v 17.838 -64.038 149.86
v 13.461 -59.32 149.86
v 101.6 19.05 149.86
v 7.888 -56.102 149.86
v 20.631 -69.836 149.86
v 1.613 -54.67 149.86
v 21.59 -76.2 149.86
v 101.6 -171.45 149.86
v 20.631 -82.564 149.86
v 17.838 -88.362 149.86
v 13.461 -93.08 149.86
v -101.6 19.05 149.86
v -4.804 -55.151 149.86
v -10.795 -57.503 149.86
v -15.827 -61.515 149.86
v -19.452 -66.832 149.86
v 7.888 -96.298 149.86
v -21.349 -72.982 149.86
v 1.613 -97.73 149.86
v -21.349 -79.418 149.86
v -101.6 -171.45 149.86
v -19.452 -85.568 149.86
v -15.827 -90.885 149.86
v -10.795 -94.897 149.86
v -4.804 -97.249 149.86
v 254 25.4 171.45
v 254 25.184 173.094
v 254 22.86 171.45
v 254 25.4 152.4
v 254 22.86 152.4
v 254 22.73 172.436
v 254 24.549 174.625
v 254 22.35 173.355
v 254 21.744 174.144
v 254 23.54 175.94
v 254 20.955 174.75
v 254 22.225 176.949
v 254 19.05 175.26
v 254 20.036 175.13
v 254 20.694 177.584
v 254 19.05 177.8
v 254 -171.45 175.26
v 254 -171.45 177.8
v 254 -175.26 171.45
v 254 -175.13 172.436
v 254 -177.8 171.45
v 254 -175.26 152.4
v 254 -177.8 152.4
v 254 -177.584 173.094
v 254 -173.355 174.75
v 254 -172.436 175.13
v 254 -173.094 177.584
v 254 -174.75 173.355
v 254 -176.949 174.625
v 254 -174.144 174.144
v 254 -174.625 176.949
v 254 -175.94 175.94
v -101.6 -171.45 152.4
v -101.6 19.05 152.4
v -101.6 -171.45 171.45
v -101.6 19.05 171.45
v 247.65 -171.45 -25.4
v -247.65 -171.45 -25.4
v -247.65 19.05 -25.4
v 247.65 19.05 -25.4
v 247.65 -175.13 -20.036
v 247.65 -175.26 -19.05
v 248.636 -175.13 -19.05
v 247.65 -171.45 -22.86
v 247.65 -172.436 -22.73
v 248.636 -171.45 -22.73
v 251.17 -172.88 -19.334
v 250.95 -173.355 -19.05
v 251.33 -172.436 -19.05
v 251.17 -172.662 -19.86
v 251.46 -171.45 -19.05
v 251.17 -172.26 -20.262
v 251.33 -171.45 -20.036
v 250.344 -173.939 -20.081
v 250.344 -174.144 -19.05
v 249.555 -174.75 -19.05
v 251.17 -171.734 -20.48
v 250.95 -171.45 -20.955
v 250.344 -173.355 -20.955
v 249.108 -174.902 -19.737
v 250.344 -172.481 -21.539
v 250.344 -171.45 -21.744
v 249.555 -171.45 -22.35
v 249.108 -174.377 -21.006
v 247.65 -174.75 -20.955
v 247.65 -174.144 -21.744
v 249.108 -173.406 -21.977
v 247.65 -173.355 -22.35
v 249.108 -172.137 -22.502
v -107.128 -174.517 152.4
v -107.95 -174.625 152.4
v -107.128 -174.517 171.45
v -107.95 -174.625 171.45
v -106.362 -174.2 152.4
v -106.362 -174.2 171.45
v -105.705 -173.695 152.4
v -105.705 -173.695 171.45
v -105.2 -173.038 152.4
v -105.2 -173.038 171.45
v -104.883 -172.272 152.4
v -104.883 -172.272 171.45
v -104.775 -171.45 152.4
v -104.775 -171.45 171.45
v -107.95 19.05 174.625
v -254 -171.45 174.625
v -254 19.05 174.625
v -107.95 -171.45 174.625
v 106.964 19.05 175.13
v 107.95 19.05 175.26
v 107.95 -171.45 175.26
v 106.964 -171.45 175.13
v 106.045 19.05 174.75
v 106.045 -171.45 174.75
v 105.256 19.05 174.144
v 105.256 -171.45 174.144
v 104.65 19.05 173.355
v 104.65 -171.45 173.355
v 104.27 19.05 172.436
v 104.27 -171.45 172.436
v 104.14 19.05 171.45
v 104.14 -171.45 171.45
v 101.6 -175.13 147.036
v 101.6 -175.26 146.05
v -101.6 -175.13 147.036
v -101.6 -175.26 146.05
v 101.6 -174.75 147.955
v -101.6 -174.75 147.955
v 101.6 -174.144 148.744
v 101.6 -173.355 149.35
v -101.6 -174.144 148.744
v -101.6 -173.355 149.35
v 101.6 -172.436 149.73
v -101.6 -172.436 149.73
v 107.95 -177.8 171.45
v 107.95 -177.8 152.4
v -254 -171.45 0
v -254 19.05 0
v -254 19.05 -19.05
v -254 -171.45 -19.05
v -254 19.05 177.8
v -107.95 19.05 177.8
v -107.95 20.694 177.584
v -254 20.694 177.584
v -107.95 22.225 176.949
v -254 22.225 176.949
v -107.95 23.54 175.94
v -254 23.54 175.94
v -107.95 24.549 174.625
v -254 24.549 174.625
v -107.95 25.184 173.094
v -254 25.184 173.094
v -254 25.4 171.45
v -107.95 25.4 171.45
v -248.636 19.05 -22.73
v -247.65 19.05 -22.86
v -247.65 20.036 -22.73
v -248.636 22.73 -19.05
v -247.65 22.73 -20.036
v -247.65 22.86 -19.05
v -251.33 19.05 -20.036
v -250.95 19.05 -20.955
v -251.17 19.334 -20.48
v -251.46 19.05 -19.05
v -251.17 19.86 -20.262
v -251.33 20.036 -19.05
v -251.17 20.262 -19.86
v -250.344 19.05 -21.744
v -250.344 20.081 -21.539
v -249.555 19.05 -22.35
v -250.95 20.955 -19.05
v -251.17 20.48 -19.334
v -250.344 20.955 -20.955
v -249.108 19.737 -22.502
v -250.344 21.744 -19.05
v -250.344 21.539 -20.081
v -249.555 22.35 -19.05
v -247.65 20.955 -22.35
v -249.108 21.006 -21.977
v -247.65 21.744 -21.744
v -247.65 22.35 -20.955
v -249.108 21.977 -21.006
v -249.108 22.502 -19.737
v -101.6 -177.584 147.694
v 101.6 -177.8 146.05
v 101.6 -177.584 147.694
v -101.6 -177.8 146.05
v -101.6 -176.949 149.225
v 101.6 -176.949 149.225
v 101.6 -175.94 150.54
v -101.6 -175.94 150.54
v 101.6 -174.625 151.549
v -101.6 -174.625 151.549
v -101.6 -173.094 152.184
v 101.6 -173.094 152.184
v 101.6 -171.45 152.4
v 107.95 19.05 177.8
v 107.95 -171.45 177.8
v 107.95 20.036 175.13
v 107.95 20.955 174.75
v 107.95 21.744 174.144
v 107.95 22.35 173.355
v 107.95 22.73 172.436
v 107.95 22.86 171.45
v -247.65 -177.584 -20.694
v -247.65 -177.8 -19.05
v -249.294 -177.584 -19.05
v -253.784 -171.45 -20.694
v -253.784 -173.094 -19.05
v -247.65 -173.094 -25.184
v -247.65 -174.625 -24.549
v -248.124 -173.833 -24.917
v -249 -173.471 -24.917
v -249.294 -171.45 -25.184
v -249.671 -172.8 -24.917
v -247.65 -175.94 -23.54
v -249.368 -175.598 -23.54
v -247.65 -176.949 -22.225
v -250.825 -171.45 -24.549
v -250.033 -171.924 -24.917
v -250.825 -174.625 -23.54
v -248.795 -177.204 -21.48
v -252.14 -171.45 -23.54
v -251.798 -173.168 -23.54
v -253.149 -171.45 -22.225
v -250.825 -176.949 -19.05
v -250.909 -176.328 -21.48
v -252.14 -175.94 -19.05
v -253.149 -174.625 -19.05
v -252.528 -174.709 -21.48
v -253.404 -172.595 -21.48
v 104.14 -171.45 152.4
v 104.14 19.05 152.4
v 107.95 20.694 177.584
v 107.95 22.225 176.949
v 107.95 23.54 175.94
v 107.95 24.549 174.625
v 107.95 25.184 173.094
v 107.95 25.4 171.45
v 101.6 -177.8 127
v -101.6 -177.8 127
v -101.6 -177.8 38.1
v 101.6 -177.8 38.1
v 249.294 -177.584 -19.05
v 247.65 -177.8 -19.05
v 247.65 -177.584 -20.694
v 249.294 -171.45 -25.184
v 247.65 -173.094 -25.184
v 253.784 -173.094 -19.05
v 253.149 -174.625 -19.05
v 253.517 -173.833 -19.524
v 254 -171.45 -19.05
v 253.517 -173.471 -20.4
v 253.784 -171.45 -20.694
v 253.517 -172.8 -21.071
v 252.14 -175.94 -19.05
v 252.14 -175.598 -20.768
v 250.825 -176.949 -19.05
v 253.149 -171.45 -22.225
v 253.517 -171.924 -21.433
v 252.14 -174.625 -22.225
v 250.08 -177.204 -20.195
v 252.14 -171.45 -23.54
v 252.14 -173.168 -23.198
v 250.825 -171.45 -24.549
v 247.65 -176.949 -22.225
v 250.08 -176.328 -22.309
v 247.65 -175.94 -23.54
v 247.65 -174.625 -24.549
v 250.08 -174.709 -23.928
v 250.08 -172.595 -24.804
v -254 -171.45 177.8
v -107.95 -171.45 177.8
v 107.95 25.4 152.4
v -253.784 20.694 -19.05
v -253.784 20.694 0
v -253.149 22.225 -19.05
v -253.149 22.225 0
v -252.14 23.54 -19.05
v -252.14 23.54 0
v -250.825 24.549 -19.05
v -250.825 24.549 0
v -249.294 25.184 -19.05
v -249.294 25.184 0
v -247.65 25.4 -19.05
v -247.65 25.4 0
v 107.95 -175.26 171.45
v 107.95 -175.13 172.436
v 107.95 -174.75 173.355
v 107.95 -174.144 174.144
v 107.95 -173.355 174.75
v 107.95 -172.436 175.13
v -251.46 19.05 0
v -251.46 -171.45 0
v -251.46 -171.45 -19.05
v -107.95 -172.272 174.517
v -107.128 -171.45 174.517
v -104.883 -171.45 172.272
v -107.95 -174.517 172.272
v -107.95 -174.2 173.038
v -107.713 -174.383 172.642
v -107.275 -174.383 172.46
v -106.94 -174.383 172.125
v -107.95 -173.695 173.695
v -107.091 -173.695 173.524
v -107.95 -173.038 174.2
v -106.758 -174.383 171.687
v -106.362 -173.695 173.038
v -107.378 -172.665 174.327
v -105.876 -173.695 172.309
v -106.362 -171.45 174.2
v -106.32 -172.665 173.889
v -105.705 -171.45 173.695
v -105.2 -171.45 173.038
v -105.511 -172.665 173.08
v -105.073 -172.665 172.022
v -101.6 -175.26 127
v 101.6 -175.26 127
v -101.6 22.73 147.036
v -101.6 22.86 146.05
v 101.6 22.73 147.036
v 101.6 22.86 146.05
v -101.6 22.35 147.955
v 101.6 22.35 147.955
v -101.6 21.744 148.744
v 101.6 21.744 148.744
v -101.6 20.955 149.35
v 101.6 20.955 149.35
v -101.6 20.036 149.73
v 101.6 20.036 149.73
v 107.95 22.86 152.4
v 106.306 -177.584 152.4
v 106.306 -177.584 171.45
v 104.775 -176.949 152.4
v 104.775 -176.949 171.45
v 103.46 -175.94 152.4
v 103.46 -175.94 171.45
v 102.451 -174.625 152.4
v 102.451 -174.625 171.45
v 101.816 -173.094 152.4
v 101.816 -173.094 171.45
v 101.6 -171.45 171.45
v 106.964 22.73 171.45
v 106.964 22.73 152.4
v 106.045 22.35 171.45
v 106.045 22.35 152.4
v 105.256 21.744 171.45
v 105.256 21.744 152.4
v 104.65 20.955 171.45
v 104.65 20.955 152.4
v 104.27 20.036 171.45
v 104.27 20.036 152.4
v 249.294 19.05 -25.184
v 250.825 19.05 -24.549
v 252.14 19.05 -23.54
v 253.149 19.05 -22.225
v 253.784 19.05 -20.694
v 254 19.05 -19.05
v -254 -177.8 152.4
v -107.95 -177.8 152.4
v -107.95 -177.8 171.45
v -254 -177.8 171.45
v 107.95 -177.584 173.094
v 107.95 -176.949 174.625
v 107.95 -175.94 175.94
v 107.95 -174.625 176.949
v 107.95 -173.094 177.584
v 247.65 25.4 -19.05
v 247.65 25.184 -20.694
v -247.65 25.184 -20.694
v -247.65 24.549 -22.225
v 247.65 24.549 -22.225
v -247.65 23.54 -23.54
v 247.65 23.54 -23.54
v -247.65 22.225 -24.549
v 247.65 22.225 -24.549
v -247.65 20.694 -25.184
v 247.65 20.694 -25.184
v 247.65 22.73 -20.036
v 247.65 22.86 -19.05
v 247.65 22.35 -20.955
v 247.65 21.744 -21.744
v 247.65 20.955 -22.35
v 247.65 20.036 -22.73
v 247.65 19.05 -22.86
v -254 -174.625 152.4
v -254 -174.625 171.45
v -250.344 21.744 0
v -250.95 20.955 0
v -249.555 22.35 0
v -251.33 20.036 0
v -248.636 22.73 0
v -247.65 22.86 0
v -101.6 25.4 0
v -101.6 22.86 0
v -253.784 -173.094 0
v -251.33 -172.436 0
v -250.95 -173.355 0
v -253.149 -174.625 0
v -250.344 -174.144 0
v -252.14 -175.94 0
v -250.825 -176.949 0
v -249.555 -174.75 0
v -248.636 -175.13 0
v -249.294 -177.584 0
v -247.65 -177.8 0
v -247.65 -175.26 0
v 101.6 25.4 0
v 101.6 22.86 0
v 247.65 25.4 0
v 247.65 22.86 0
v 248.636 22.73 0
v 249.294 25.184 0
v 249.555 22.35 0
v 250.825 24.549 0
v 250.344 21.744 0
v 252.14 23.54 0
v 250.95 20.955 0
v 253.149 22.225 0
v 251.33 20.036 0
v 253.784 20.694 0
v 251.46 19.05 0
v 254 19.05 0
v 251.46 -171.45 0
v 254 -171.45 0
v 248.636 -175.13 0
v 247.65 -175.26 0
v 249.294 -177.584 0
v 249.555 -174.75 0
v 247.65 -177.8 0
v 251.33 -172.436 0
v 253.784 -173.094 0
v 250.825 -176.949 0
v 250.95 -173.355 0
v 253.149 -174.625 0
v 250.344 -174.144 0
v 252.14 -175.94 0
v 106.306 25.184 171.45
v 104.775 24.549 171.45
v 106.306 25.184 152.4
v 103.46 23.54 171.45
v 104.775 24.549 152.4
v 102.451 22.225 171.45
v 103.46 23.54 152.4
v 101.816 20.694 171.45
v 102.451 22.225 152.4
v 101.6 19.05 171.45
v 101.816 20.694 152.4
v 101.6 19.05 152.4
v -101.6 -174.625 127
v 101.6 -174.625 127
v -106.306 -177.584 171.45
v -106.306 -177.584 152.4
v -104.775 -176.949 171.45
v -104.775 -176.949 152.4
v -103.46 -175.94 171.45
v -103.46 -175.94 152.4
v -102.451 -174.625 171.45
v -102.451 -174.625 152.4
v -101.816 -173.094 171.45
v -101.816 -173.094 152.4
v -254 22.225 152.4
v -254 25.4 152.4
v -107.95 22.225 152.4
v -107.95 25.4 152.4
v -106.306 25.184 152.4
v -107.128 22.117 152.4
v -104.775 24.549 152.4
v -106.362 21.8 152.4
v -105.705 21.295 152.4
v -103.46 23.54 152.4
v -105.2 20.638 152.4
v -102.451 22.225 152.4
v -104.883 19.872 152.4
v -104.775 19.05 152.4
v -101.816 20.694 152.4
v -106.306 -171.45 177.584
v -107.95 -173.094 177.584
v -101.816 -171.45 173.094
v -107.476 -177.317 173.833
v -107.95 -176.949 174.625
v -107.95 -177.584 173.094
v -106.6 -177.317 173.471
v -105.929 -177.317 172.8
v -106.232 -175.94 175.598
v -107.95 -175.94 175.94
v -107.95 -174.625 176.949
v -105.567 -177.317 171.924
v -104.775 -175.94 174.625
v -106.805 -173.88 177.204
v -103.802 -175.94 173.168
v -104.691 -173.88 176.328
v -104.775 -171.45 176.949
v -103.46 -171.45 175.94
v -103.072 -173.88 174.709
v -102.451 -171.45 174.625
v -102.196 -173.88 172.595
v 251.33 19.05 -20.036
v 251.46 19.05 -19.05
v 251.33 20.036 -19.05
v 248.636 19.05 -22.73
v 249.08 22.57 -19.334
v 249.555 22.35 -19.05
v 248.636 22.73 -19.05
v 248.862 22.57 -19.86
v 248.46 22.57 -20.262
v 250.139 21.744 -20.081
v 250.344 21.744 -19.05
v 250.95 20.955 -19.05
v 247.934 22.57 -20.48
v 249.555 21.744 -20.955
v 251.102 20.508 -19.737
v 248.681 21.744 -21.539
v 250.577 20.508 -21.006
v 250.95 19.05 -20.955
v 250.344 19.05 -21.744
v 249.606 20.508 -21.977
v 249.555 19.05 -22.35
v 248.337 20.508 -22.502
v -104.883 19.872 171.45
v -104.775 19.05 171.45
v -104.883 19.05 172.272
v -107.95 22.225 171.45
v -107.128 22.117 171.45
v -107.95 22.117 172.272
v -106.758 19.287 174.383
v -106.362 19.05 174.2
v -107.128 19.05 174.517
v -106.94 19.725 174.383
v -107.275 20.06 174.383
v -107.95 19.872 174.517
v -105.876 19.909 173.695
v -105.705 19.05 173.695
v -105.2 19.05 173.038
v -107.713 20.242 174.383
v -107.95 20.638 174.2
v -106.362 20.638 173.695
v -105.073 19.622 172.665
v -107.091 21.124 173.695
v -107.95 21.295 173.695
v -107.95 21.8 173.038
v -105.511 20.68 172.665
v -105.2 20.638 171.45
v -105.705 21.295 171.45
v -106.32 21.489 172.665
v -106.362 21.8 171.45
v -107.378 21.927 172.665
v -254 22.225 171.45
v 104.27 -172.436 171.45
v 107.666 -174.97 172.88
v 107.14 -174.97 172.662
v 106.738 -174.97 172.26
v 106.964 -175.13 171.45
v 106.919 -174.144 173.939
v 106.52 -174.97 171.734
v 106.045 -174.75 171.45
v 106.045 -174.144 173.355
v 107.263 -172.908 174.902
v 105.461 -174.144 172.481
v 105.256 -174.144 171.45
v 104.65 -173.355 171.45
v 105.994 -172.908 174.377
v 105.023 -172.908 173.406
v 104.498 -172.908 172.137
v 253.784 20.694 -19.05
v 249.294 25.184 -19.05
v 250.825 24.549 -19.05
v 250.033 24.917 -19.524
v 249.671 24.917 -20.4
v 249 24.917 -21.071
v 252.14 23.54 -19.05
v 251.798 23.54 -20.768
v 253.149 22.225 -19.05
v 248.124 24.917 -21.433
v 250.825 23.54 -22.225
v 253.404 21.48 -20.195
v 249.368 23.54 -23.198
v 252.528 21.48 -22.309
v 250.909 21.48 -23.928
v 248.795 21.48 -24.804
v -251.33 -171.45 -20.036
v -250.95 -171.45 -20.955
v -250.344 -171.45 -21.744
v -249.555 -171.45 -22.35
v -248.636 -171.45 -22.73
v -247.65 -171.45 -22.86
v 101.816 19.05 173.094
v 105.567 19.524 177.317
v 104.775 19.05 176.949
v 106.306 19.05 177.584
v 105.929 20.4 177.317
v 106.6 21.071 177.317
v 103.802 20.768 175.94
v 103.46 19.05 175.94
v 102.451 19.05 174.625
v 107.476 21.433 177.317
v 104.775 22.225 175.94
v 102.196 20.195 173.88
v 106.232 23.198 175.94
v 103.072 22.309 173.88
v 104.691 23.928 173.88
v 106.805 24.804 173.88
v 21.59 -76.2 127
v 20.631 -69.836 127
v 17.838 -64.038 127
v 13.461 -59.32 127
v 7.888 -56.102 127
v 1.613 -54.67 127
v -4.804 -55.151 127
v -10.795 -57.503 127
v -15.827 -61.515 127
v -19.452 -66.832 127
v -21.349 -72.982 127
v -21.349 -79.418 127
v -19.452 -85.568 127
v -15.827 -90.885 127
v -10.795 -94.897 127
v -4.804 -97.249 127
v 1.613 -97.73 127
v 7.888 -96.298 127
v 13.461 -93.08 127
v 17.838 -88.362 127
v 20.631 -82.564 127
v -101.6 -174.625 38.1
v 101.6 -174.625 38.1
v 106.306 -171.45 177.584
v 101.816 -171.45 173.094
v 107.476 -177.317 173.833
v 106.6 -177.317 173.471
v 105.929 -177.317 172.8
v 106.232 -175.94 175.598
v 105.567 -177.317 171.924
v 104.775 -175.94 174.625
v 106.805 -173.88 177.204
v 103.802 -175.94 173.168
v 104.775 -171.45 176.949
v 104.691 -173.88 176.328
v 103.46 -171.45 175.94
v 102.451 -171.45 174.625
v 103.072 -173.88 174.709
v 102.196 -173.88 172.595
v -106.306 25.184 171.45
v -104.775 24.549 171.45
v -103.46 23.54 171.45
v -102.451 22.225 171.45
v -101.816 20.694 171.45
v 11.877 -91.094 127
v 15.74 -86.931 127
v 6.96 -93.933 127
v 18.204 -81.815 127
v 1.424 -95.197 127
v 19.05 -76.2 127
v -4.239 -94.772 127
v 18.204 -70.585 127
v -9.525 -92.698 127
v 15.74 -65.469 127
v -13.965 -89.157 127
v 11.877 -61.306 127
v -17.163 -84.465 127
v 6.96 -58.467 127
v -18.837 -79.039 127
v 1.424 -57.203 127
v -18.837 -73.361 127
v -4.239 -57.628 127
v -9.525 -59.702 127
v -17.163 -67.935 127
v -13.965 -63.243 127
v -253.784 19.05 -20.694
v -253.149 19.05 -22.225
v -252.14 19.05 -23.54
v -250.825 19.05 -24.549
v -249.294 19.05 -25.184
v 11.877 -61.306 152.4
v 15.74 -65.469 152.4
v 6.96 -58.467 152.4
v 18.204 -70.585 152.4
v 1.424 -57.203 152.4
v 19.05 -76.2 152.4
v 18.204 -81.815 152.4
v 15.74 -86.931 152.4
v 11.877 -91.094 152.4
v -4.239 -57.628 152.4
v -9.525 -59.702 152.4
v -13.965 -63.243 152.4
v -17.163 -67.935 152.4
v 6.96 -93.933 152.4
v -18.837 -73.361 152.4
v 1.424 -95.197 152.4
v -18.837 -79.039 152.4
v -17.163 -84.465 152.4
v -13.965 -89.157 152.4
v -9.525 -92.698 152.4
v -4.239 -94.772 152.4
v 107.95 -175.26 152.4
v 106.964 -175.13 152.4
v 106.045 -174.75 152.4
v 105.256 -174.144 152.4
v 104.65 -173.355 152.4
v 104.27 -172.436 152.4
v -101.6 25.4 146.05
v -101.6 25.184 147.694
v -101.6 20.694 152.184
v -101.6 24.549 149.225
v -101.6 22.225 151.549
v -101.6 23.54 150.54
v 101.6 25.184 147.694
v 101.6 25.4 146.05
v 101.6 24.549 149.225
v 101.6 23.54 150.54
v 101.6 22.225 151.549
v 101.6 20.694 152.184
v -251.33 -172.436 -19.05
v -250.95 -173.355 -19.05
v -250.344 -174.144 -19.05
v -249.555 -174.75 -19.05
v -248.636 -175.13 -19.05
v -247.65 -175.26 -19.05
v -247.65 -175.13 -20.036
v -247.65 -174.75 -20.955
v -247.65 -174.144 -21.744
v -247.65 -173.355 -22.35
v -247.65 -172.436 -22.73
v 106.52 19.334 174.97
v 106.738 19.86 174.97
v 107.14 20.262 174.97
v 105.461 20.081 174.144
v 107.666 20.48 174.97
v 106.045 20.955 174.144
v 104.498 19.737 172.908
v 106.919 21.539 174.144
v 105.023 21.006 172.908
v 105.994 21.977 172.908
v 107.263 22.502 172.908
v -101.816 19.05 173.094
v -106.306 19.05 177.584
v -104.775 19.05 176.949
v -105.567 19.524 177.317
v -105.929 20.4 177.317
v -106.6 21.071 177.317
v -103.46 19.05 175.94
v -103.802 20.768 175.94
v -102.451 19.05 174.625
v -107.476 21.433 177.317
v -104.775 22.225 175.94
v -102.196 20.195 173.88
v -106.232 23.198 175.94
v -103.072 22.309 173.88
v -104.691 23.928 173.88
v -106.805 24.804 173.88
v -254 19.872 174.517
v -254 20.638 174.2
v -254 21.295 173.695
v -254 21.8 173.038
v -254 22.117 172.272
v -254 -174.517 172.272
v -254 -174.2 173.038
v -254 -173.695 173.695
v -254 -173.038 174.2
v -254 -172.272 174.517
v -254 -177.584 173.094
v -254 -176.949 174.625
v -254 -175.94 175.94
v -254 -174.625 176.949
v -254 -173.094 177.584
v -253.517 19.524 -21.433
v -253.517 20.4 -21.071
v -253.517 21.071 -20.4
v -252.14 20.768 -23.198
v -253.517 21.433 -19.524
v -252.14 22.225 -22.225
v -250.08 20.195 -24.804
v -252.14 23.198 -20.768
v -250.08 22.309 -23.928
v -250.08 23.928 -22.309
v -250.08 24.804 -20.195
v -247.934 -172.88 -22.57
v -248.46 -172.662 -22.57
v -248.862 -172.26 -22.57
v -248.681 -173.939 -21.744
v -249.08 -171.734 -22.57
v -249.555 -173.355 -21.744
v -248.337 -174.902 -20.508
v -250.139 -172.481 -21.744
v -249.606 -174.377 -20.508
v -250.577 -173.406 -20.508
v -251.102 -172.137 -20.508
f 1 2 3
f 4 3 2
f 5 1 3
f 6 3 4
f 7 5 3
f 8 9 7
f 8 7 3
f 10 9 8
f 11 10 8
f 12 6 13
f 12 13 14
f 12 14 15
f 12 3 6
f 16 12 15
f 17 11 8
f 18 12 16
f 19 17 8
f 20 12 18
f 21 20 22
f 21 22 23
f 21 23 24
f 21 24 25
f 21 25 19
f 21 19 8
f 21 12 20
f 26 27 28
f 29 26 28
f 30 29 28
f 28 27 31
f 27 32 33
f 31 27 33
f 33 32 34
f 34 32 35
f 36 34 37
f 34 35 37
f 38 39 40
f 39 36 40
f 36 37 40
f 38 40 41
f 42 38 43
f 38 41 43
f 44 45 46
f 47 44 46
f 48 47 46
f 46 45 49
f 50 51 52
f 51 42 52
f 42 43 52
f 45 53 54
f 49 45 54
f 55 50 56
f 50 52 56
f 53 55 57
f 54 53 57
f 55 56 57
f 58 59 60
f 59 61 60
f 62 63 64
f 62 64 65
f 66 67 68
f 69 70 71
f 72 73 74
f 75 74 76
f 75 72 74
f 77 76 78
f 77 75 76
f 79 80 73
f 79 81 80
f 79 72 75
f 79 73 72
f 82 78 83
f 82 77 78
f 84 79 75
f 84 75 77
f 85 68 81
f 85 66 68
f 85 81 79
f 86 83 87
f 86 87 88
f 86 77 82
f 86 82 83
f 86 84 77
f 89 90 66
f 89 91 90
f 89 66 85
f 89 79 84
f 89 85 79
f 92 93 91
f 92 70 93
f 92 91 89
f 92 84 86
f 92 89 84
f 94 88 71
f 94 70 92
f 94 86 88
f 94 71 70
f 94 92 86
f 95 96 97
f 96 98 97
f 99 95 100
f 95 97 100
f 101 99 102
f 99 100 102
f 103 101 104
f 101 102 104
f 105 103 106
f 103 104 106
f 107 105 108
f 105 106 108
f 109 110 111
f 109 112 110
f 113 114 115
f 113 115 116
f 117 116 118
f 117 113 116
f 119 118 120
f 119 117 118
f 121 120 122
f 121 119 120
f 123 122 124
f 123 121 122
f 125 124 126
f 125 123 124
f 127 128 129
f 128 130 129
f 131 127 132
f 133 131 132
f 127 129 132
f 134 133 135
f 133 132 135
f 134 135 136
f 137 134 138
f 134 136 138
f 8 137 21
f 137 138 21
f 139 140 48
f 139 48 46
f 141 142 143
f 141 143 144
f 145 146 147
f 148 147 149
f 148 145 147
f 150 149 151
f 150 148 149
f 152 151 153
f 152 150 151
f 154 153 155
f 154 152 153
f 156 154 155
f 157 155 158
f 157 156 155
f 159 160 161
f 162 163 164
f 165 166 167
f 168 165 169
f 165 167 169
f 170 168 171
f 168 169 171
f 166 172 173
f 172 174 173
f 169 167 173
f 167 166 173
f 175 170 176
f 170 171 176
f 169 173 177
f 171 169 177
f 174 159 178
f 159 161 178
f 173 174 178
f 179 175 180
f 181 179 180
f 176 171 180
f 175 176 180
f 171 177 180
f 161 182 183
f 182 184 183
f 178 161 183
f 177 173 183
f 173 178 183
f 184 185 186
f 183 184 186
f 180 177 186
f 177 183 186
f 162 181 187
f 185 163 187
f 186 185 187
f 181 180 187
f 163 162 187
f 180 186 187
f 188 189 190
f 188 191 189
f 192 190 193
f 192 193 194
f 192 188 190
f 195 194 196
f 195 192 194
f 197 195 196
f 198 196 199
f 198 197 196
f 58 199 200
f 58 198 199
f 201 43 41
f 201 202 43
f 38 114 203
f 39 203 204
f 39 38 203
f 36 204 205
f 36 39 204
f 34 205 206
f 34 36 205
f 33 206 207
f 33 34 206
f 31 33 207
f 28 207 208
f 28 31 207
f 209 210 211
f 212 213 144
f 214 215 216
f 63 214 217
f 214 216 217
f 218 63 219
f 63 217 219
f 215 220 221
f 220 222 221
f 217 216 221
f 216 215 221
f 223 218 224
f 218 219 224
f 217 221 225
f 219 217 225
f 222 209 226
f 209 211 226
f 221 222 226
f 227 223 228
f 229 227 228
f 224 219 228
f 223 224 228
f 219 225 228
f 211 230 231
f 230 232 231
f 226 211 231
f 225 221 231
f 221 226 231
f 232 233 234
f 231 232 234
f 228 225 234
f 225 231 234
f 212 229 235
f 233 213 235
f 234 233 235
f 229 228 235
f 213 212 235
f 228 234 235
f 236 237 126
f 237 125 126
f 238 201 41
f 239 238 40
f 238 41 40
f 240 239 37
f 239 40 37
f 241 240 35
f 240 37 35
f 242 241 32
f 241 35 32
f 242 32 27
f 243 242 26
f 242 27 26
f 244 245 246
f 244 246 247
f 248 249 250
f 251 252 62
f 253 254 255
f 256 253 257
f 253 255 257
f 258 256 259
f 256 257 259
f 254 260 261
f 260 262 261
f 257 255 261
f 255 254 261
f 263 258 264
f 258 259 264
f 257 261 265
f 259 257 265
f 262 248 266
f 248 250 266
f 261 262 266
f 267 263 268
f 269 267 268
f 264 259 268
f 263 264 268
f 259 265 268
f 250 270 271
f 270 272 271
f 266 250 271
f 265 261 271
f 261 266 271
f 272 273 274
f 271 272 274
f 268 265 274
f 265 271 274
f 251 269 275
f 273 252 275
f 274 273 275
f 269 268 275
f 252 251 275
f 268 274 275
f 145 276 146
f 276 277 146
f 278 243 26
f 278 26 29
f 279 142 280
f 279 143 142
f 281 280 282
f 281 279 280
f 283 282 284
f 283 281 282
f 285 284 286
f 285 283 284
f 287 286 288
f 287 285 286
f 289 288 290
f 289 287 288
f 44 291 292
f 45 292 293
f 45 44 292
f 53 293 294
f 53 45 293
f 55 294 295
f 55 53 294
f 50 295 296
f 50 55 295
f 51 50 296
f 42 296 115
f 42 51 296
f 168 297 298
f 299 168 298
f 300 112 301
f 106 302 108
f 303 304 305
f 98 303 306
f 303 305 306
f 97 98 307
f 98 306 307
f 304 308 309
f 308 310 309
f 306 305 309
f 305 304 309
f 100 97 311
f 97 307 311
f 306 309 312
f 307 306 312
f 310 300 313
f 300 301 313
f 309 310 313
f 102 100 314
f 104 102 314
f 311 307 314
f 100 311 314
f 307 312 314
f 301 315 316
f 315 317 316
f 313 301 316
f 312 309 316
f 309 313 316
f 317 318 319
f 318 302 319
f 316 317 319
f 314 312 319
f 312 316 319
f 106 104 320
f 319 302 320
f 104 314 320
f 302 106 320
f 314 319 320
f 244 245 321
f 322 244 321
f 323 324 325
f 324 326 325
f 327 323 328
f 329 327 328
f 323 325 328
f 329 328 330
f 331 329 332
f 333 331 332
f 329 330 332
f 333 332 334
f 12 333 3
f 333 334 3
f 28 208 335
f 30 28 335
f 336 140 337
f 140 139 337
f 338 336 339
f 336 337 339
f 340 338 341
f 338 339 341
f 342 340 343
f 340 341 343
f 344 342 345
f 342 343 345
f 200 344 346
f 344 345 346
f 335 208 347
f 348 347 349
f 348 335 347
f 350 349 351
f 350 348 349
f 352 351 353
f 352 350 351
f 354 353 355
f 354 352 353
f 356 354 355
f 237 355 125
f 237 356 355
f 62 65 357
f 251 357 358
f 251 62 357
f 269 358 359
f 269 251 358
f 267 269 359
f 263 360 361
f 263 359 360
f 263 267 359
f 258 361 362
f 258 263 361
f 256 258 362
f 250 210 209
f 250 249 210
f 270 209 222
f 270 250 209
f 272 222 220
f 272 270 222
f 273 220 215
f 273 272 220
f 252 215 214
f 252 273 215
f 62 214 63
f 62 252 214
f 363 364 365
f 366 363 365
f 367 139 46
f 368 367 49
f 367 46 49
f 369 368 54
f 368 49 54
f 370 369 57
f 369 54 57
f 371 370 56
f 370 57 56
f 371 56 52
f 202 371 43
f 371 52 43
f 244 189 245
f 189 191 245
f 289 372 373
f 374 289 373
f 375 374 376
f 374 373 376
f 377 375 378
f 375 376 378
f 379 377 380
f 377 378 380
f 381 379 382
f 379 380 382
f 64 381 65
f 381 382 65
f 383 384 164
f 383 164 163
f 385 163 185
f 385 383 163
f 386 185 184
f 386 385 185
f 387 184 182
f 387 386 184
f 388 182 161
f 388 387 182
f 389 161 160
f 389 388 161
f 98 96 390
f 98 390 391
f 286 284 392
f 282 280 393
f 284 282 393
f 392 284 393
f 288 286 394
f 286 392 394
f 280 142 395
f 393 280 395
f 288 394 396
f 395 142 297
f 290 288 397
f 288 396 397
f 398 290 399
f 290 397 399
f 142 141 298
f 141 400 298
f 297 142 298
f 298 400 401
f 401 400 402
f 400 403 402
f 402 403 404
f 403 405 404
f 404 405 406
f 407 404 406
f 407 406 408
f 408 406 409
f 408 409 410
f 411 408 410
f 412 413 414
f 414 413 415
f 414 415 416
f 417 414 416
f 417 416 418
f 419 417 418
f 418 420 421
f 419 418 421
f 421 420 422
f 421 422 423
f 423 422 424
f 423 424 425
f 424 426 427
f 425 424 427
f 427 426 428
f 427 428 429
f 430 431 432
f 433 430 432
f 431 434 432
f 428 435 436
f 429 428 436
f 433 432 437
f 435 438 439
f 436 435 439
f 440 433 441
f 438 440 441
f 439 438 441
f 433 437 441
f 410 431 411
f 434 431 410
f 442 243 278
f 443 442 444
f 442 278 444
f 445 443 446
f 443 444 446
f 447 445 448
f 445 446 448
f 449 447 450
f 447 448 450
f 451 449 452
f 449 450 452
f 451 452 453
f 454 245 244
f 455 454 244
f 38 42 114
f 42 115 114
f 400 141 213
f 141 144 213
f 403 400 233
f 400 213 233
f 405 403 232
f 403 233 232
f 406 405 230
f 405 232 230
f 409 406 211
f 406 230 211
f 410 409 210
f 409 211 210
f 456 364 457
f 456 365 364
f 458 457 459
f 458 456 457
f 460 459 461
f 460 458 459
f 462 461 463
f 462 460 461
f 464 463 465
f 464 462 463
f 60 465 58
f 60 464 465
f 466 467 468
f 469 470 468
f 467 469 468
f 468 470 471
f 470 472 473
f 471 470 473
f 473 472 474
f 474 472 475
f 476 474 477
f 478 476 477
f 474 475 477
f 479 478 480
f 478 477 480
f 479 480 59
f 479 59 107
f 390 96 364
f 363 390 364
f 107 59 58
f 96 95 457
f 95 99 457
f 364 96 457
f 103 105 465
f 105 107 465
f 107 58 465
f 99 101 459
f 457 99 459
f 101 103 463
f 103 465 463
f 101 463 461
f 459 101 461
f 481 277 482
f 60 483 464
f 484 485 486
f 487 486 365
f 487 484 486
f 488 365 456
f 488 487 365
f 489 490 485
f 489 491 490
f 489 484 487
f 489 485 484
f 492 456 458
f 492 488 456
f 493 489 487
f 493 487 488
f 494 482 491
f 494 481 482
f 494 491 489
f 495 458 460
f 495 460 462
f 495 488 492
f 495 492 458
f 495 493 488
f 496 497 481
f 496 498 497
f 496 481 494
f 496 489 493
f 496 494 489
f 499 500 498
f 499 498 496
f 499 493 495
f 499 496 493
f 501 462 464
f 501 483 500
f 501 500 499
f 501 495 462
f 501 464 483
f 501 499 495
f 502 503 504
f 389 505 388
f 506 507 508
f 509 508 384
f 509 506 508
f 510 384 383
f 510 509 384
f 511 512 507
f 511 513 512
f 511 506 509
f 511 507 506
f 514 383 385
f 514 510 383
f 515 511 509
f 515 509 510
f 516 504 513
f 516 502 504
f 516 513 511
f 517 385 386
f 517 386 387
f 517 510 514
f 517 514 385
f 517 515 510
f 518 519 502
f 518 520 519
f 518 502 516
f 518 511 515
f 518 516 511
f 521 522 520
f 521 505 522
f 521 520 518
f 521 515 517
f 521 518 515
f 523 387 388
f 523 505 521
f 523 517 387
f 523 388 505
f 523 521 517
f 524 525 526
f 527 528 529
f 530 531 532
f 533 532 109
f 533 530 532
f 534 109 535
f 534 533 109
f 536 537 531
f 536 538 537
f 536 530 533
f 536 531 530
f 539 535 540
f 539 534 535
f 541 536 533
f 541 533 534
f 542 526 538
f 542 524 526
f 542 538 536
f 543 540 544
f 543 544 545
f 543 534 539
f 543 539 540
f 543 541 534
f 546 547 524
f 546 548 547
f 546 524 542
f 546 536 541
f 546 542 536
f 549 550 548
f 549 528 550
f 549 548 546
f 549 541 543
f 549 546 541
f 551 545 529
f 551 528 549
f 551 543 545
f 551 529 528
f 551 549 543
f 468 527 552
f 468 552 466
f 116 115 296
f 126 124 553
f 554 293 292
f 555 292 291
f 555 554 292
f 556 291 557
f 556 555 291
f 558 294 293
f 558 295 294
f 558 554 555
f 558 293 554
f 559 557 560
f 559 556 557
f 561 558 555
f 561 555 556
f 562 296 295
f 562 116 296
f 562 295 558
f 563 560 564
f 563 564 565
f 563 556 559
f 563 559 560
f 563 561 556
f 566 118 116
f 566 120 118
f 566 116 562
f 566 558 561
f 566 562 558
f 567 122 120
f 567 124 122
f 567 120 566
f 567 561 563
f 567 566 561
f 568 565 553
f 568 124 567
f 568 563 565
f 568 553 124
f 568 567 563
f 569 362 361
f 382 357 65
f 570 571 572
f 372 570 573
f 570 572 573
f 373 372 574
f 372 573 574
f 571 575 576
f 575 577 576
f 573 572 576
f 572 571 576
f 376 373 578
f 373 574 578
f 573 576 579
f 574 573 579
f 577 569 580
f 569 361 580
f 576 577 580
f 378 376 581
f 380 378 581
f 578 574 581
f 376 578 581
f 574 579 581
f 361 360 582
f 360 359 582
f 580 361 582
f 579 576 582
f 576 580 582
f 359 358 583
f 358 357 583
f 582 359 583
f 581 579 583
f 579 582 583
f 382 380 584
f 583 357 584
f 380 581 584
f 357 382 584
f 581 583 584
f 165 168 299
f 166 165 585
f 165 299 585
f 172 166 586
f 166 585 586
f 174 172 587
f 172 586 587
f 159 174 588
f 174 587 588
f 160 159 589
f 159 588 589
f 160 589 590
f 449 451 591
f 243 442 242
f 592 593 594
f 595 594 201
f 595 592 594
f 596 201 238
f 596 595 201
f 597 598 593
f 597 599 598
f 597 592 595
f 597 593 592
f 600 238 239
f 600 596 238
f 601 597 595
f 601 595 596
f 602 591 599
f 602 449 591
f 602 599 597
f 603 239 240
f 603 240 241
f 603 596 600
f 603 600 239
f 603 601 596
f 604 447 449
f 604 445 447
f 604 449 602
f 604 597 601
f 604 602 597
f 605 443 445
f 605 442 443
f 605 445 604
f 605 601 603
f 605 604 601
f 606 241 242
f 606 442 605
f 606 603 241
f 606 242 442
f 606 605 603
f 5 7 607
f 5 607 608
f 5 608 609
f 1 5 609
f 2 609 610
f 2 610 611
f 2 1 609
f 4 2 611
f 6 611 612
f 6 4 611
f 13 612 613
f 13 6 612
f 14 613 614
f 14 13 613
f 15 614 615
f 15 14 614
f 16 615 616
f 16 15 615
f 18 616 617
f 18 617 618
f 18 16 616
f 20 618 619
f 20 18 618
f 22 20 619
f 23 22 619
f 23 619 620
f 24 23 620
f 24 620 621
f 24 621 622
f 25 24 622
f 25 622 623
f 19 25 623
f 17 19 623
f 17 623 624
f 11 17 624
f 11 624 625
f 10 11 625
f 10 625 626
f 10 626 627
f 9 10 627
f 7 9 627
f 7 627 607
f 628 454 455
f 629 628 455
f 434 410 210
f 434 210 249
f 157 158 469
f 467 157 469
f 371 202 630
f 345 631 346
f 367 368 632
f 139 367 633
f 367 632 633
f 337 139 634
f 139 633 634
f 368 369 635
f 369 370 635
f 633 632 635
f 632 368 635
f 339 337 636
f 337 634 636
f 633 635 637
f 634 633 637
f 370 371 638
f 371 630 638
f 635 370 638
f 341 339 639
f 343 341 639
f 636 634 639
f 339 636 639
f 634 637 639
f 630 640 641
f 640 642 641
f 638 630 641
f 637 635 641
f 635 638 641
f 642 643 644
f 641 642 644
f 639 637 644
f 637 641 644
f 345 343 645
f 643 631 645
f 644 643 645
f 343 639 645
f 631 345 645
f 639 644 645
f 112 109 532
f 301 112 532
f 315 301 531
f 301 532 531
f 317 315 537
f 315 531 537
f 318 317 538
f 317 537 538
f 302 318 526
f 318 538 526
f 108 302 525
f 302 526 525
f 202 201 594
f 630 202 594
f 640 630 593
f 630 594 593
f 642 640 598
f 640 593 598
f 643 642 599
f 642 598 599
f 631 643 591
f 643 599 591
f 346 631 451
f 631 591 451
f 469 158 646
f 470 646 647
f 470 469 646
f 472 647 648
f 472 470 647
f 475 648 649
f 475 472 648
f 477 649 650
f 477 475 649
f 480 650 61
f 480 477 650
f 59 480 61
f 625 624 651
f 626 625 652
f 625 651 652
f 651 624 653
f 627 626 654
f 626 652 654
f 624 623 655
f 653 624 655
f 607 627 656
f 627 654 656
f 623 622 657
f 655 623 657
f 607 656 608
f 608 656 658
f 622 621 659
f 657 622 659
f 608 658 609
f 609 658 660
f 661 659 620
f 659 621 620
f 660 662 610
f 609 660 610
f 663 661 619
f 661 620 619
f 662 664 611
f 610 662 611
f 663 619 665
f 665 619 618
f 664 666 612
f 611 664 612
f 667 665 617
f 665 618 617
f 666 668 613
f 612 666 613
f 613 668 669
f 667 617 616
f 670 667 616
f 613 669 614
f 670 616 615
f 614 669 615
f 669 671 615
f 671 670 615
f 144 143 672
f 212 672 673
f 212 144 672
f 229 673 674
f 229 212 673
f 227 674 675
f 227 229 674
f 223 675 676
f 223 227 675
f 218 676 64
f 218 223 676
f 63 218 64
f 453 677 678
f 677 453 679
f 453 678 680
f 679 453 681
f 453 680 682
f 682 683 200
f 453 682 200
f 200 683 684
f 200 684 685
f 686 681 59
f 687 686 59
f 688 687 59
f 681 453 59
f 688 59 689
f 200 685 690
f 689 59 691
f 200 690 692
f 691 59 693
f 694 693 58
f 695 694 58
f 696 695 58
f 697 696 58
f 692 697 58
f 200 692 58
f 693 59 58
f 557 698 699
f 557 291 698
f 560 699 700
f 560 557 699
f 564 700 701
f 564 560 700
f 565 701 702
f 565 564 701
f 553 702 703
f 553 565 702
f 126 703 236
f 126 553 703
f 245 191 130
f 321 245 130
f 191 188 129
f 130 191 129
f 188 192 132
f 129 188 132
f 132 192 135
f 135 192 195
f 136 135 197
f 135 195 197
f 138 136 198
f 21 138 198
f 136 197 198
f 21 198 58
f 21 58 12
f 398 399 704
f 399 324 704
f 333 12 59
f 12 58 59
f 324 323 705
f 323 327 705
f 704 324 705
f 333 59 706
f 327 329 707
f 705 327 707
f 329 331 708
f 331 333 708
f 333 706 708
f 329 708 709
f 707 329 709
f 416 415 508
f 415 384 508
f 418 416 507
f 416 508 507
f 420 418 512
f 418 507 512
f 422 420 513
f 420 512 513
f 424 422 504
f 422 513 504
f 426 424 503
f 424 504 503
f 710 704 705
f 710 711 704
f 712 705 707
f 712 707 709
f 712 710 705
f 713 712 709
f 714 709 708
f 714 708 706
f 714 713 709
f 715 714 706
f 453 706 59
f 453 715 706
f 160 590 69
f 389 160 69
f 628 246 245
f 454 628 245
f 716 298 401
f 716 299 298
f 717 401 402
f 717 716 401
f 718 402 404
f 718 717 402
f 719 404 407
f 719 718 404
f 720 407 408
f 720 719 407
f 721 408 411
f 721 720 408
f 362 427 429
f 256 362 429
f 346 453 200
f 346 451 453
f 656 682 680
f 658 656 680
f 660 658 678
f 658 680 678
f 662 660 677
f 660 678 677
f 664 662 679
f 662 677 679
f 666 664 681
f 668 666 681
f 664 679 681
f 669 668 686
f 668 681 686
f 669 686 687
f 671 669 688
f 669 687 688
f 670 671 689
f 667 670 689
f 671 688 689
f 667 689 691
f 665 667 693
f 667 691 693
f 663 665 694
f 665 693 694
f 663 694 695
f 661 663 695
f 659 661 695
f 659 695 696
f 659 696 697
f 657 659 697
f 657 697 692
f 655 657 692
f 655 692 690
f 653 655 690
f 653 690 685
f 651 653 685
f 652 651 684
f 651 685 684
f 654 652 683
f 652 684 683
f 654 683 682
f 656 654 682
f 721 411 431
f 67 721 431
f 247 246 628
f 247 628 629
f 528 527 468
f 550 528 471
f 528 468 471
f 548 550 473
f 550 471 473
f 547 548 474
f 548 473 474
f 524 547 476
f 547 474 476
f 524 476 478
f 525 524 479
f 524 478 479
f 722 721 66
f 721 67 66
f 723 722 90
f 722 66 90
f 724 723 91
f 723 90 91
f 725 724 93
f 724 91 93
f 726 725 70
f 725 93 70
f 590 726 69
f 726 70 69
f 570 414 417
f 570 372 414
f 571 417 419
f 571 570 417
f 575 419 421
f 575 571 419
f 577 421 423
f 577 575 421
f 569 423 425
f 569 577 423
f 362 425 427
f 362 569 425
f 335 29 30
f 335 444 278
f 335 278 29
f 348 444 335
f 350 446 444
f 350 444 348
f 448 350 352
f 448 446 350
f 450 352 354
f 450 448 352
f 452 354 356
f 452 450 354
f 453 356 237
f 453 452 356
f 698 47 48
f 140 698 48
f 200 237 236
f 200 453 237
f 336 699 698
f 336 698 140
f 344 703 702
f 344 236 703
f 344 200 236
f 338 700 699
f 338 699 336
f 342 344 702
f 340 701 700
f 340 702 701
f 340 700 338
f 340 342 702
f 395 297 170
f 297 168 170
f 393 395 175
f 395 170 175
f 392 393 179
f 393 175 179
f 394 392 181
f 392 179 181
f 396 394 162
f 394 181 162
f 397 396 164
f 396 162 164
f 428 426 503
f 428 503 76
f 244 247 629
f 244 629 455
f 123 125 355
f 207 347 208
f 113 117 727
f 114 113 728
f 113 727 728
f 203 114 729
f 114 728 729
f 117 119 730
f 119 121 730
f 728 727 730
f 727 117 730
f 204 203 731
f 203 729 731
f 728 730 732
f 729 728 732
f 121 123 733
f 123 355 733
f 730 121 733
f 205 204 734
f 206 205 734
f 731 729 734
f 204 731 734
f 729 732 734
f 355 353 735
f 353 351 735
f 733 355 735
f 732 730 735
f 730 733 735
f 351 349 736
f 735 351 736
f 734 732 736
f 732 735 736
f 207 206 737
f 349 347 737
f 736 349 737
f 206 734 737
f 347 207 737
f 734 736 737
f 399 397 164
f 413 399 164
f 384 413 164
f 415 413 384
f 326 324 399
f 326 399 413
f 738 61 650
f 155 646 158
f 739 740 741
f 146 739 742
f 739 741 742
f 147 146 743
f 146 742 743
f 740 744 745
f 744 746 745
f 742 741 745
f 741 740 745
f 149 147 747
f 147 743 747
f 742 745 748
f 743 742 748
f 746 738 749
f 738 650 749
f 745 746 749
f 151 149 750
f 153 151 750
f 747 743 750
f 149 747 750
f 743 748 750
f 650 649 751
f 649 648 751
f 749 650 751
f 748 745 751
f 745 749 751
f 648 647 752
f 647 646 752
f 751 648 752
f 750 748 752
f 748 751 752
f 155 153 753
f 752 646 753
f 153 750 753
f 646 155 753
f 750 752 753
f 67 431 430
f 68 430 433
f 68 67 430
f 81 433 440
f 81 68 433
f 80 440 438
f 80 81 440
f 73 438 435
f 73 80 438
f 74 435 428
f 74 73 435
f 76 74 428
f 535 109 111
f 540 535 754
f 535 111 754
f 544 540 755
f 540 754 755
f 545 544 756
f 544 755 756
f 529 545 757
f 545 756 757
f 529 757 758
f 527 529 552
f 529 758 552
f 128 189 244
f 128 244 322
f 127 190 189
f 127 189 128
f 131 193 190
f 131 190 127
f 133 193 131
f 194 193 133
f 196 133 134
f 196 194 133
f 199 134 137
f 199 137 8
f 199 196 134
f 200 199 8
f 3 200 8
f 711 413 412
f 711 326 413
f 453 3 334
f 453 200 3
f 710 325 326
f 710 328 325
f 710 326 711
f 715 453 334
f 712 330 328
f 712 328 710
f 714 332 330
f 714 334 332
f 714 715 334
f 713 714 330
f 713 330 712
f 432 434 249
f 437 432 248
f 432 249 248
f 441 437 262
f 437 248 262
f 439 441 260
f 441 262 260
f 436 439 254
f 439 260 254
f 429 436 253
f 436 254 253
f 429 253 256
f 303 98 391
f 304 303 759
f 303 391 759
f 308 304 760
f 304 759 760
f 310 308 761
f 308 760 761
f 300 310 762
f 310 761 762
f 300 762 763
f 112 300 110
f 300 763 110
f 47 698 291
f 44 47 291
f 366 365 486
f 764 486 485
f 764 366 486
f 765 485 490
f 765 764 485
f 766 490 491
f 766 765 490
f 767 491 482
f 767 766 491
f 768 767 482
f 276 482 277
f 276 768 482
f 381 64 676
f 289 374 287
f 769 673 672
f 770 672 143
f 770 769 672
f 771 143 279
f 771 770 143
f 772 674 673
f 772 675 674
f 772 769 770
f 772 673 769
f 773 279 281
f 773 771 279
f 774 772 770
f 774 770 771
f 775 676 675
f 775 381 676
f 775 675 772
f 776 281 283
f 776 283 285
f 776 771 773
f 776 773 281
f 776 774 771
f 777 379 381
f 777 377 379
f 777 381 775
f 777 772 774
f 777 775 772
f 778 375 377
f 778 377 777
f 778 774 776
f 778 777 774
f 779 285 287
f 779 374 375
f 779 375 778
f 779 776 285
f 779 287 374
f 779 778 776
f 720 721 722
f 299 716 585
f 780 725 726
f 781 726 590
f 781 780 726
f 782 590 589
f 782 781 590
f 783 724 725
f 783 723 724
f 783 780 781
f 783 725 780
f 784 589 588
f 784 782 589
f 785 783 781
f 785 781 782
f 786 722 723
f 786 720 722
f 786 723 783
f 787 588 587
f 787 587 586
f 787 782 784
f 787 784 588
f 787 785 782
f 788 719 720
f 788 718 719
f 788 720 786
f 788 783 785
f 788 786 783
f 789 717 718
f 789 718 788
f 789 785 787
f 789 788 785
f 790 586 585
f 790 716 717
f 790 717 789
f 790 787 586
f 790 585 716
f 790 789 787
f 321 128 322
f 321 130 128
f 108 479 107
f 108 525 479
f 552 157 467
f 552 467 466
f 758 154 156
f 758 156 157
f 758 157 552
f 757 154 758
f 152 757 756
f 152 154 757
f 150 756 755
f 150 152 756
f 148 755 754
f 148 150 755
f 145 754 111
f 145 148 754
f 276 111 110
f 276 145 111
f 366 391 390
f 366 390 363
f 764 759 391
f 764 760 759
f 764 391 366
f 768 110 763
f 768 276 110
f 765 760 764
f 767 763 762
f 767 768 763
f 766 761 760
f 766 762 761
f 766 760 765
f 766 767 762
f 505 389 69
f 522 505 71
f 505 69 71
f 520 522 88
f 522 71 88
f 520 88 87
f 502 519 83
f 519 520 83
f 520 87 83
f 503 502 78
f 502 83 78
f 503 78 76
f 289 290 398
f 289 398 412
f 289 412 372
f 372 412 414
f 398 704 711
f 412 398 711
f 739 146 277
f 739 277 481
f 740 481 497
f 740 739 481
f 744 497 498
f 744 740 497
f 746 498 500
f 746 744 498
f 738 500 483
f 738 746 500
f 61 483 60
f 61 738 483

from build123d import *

# Parameters (mm, degrees)
F1_DEPTH      = 101.6
F1_DEPTH_BACK = 101.6
F2_R          = 19.05
F3_DEPTH      = 25.4
F4_R          = 6.35
F6_DEPTH      = 152.4
F7_R          = 6.35
F9_W          = 508
F9_H          = 203.2
F10_DEPTH     = 25.4
F11_R         = 6.35
F12_T         = -3.175
F13_T         = -2.54
F14_T         = -2.54
F15_W         = 203.2
F15_H         = 88.9
F16_DEPTH     = 3.175


with BuildPart() as f1:
    # F0 (on Right) → F1 (new body, two sides)
    with BuildSketch(Plane.YZ) as f1_sk:
        Polygon((0, 127), (0, 0), (25.4, 0), (25.4, 152.4), (-177.8, 152.4), (-177.8, 127), align=None)
    extrude(amount=-F1_DEPTH)
    extrude(f1_sk.sketch, amount=F1_DEPTH_BACK)

    # F2 (on face) → F3 (cut)
    with BuildSketch(Plane.XY.offset(152.4)):
        with Locations((0, -76.2)):
            Circle(F2_R)
    extrude(amount=-F3_DEPTH, mode=Mode.SUBTRACT)

    # F4
    f4_edges = [f1.edges().sort_by_distance(p)[0] for p in [
        (0, 25.4, 152.4),
        (0, -177.8, 152.4),
    ]]
    fillet(f4_edges, radius=F4_R)

    # F9 (on face) → F10 (join)
    with BuildSketch(Plane(origin=(0, 0, 0), x_dir=(1, 0, 0), z_dir=(0, 0, -1))):
        with Locations((0, 76.2)):
            Rectangle(F9_W, F9_H)
    extrude(amount=F10_DEPTH)

    # F11
    f11_edges = [f1.edges().sort_by_distance(p)[0] for p in [
        (-254, -177.8, -12.7),
        (0, -177.8, -25.4),
        (254, -177.8, -12.7),
        (254, -76.2, -25.4),
        (254, 25.4, -12.7),
        (0, 25.4, -25.4),
        (-254, -76.2, -25.4),
        (-254, 25.4, -12.7),
    ]]
    fillet(f11_edges, radius=F11_R)

    # F14
    f14_openings = [f1.faces().sort_by_distance(p)[0] for p in [
        (0, -80.880599, 0),
        (0, 0, 63.5),
        (-98.899943, -88.9, 127),
        (-101.6, 22.86, 73.025),
        (101.6, 22.86, 73.025),
    ]]
    offset(amount=F14_T, openings=f14_openings)


with BuildPart() as f6:
    # F5 (on face) → F6 (new body)
    with BuildSketch(Plane(origin=(-101.6, 0, 0), x_dir=(0, -1, 0), z_dir=(-1, 0, 0))):
        Polygon((171.45, 152.4), (177.8, 152.4), (177.8, 177.8), (-25.4, 177.8), (-25.4, 152.4), (-19.05, 152.4), align=None)
    extrude(amount=F6_DEPTH)

    # F7
    f7_edges = [f6.edges().sort_by_distance(p)[0] for p in [
        (-101.6, 25.4, 165.1),
        (-101.6, -76.2, 177.8),
        (-177.8, 25.4, 177.8),
        (-177.8, -177.8, 177.8),
        (-101.6, -177.8, 165.1),
    ]]
    fillet(f7_edges, radius=F7_R)


with BuildPart() as f8_1:
    # F8: instance of F6
    add(f6.part.mirror(Plane.YZ))

    # F13
    f13_openings = [f8_1.faces().sort_by_distance(p)[0] for p in [
        (254, -76.2, 165.062044),
        (177.841816, -76.2, 152.4),
    ]]
    offset(amount=F13_T, openings=f13_openings)


with BuildPart() as f6_1:
    add(f6.part)

    # F12
    f12_openings = [f6_1.faces().sort_by_distance(p)[0] for p in [
        (-254, -76.2, 165.062044),
        (-177.841816, -76.2, 152.4),
    ]]
    offset(amount=F12_T, openings=f12_openings)


with BuildPart() as f16:
    # F15 (on face) → F16 (new body)
    with BuildSketch(Plane.XZ.offset(177.8)):
        with Locations((0, 82.55)):
            Rectangle(F15_W, F15_H)
    extrude(amount=-F16_DEPTH)


solid = Compound([f1.part, f8_1.part, f6_1.part, f16.part])
